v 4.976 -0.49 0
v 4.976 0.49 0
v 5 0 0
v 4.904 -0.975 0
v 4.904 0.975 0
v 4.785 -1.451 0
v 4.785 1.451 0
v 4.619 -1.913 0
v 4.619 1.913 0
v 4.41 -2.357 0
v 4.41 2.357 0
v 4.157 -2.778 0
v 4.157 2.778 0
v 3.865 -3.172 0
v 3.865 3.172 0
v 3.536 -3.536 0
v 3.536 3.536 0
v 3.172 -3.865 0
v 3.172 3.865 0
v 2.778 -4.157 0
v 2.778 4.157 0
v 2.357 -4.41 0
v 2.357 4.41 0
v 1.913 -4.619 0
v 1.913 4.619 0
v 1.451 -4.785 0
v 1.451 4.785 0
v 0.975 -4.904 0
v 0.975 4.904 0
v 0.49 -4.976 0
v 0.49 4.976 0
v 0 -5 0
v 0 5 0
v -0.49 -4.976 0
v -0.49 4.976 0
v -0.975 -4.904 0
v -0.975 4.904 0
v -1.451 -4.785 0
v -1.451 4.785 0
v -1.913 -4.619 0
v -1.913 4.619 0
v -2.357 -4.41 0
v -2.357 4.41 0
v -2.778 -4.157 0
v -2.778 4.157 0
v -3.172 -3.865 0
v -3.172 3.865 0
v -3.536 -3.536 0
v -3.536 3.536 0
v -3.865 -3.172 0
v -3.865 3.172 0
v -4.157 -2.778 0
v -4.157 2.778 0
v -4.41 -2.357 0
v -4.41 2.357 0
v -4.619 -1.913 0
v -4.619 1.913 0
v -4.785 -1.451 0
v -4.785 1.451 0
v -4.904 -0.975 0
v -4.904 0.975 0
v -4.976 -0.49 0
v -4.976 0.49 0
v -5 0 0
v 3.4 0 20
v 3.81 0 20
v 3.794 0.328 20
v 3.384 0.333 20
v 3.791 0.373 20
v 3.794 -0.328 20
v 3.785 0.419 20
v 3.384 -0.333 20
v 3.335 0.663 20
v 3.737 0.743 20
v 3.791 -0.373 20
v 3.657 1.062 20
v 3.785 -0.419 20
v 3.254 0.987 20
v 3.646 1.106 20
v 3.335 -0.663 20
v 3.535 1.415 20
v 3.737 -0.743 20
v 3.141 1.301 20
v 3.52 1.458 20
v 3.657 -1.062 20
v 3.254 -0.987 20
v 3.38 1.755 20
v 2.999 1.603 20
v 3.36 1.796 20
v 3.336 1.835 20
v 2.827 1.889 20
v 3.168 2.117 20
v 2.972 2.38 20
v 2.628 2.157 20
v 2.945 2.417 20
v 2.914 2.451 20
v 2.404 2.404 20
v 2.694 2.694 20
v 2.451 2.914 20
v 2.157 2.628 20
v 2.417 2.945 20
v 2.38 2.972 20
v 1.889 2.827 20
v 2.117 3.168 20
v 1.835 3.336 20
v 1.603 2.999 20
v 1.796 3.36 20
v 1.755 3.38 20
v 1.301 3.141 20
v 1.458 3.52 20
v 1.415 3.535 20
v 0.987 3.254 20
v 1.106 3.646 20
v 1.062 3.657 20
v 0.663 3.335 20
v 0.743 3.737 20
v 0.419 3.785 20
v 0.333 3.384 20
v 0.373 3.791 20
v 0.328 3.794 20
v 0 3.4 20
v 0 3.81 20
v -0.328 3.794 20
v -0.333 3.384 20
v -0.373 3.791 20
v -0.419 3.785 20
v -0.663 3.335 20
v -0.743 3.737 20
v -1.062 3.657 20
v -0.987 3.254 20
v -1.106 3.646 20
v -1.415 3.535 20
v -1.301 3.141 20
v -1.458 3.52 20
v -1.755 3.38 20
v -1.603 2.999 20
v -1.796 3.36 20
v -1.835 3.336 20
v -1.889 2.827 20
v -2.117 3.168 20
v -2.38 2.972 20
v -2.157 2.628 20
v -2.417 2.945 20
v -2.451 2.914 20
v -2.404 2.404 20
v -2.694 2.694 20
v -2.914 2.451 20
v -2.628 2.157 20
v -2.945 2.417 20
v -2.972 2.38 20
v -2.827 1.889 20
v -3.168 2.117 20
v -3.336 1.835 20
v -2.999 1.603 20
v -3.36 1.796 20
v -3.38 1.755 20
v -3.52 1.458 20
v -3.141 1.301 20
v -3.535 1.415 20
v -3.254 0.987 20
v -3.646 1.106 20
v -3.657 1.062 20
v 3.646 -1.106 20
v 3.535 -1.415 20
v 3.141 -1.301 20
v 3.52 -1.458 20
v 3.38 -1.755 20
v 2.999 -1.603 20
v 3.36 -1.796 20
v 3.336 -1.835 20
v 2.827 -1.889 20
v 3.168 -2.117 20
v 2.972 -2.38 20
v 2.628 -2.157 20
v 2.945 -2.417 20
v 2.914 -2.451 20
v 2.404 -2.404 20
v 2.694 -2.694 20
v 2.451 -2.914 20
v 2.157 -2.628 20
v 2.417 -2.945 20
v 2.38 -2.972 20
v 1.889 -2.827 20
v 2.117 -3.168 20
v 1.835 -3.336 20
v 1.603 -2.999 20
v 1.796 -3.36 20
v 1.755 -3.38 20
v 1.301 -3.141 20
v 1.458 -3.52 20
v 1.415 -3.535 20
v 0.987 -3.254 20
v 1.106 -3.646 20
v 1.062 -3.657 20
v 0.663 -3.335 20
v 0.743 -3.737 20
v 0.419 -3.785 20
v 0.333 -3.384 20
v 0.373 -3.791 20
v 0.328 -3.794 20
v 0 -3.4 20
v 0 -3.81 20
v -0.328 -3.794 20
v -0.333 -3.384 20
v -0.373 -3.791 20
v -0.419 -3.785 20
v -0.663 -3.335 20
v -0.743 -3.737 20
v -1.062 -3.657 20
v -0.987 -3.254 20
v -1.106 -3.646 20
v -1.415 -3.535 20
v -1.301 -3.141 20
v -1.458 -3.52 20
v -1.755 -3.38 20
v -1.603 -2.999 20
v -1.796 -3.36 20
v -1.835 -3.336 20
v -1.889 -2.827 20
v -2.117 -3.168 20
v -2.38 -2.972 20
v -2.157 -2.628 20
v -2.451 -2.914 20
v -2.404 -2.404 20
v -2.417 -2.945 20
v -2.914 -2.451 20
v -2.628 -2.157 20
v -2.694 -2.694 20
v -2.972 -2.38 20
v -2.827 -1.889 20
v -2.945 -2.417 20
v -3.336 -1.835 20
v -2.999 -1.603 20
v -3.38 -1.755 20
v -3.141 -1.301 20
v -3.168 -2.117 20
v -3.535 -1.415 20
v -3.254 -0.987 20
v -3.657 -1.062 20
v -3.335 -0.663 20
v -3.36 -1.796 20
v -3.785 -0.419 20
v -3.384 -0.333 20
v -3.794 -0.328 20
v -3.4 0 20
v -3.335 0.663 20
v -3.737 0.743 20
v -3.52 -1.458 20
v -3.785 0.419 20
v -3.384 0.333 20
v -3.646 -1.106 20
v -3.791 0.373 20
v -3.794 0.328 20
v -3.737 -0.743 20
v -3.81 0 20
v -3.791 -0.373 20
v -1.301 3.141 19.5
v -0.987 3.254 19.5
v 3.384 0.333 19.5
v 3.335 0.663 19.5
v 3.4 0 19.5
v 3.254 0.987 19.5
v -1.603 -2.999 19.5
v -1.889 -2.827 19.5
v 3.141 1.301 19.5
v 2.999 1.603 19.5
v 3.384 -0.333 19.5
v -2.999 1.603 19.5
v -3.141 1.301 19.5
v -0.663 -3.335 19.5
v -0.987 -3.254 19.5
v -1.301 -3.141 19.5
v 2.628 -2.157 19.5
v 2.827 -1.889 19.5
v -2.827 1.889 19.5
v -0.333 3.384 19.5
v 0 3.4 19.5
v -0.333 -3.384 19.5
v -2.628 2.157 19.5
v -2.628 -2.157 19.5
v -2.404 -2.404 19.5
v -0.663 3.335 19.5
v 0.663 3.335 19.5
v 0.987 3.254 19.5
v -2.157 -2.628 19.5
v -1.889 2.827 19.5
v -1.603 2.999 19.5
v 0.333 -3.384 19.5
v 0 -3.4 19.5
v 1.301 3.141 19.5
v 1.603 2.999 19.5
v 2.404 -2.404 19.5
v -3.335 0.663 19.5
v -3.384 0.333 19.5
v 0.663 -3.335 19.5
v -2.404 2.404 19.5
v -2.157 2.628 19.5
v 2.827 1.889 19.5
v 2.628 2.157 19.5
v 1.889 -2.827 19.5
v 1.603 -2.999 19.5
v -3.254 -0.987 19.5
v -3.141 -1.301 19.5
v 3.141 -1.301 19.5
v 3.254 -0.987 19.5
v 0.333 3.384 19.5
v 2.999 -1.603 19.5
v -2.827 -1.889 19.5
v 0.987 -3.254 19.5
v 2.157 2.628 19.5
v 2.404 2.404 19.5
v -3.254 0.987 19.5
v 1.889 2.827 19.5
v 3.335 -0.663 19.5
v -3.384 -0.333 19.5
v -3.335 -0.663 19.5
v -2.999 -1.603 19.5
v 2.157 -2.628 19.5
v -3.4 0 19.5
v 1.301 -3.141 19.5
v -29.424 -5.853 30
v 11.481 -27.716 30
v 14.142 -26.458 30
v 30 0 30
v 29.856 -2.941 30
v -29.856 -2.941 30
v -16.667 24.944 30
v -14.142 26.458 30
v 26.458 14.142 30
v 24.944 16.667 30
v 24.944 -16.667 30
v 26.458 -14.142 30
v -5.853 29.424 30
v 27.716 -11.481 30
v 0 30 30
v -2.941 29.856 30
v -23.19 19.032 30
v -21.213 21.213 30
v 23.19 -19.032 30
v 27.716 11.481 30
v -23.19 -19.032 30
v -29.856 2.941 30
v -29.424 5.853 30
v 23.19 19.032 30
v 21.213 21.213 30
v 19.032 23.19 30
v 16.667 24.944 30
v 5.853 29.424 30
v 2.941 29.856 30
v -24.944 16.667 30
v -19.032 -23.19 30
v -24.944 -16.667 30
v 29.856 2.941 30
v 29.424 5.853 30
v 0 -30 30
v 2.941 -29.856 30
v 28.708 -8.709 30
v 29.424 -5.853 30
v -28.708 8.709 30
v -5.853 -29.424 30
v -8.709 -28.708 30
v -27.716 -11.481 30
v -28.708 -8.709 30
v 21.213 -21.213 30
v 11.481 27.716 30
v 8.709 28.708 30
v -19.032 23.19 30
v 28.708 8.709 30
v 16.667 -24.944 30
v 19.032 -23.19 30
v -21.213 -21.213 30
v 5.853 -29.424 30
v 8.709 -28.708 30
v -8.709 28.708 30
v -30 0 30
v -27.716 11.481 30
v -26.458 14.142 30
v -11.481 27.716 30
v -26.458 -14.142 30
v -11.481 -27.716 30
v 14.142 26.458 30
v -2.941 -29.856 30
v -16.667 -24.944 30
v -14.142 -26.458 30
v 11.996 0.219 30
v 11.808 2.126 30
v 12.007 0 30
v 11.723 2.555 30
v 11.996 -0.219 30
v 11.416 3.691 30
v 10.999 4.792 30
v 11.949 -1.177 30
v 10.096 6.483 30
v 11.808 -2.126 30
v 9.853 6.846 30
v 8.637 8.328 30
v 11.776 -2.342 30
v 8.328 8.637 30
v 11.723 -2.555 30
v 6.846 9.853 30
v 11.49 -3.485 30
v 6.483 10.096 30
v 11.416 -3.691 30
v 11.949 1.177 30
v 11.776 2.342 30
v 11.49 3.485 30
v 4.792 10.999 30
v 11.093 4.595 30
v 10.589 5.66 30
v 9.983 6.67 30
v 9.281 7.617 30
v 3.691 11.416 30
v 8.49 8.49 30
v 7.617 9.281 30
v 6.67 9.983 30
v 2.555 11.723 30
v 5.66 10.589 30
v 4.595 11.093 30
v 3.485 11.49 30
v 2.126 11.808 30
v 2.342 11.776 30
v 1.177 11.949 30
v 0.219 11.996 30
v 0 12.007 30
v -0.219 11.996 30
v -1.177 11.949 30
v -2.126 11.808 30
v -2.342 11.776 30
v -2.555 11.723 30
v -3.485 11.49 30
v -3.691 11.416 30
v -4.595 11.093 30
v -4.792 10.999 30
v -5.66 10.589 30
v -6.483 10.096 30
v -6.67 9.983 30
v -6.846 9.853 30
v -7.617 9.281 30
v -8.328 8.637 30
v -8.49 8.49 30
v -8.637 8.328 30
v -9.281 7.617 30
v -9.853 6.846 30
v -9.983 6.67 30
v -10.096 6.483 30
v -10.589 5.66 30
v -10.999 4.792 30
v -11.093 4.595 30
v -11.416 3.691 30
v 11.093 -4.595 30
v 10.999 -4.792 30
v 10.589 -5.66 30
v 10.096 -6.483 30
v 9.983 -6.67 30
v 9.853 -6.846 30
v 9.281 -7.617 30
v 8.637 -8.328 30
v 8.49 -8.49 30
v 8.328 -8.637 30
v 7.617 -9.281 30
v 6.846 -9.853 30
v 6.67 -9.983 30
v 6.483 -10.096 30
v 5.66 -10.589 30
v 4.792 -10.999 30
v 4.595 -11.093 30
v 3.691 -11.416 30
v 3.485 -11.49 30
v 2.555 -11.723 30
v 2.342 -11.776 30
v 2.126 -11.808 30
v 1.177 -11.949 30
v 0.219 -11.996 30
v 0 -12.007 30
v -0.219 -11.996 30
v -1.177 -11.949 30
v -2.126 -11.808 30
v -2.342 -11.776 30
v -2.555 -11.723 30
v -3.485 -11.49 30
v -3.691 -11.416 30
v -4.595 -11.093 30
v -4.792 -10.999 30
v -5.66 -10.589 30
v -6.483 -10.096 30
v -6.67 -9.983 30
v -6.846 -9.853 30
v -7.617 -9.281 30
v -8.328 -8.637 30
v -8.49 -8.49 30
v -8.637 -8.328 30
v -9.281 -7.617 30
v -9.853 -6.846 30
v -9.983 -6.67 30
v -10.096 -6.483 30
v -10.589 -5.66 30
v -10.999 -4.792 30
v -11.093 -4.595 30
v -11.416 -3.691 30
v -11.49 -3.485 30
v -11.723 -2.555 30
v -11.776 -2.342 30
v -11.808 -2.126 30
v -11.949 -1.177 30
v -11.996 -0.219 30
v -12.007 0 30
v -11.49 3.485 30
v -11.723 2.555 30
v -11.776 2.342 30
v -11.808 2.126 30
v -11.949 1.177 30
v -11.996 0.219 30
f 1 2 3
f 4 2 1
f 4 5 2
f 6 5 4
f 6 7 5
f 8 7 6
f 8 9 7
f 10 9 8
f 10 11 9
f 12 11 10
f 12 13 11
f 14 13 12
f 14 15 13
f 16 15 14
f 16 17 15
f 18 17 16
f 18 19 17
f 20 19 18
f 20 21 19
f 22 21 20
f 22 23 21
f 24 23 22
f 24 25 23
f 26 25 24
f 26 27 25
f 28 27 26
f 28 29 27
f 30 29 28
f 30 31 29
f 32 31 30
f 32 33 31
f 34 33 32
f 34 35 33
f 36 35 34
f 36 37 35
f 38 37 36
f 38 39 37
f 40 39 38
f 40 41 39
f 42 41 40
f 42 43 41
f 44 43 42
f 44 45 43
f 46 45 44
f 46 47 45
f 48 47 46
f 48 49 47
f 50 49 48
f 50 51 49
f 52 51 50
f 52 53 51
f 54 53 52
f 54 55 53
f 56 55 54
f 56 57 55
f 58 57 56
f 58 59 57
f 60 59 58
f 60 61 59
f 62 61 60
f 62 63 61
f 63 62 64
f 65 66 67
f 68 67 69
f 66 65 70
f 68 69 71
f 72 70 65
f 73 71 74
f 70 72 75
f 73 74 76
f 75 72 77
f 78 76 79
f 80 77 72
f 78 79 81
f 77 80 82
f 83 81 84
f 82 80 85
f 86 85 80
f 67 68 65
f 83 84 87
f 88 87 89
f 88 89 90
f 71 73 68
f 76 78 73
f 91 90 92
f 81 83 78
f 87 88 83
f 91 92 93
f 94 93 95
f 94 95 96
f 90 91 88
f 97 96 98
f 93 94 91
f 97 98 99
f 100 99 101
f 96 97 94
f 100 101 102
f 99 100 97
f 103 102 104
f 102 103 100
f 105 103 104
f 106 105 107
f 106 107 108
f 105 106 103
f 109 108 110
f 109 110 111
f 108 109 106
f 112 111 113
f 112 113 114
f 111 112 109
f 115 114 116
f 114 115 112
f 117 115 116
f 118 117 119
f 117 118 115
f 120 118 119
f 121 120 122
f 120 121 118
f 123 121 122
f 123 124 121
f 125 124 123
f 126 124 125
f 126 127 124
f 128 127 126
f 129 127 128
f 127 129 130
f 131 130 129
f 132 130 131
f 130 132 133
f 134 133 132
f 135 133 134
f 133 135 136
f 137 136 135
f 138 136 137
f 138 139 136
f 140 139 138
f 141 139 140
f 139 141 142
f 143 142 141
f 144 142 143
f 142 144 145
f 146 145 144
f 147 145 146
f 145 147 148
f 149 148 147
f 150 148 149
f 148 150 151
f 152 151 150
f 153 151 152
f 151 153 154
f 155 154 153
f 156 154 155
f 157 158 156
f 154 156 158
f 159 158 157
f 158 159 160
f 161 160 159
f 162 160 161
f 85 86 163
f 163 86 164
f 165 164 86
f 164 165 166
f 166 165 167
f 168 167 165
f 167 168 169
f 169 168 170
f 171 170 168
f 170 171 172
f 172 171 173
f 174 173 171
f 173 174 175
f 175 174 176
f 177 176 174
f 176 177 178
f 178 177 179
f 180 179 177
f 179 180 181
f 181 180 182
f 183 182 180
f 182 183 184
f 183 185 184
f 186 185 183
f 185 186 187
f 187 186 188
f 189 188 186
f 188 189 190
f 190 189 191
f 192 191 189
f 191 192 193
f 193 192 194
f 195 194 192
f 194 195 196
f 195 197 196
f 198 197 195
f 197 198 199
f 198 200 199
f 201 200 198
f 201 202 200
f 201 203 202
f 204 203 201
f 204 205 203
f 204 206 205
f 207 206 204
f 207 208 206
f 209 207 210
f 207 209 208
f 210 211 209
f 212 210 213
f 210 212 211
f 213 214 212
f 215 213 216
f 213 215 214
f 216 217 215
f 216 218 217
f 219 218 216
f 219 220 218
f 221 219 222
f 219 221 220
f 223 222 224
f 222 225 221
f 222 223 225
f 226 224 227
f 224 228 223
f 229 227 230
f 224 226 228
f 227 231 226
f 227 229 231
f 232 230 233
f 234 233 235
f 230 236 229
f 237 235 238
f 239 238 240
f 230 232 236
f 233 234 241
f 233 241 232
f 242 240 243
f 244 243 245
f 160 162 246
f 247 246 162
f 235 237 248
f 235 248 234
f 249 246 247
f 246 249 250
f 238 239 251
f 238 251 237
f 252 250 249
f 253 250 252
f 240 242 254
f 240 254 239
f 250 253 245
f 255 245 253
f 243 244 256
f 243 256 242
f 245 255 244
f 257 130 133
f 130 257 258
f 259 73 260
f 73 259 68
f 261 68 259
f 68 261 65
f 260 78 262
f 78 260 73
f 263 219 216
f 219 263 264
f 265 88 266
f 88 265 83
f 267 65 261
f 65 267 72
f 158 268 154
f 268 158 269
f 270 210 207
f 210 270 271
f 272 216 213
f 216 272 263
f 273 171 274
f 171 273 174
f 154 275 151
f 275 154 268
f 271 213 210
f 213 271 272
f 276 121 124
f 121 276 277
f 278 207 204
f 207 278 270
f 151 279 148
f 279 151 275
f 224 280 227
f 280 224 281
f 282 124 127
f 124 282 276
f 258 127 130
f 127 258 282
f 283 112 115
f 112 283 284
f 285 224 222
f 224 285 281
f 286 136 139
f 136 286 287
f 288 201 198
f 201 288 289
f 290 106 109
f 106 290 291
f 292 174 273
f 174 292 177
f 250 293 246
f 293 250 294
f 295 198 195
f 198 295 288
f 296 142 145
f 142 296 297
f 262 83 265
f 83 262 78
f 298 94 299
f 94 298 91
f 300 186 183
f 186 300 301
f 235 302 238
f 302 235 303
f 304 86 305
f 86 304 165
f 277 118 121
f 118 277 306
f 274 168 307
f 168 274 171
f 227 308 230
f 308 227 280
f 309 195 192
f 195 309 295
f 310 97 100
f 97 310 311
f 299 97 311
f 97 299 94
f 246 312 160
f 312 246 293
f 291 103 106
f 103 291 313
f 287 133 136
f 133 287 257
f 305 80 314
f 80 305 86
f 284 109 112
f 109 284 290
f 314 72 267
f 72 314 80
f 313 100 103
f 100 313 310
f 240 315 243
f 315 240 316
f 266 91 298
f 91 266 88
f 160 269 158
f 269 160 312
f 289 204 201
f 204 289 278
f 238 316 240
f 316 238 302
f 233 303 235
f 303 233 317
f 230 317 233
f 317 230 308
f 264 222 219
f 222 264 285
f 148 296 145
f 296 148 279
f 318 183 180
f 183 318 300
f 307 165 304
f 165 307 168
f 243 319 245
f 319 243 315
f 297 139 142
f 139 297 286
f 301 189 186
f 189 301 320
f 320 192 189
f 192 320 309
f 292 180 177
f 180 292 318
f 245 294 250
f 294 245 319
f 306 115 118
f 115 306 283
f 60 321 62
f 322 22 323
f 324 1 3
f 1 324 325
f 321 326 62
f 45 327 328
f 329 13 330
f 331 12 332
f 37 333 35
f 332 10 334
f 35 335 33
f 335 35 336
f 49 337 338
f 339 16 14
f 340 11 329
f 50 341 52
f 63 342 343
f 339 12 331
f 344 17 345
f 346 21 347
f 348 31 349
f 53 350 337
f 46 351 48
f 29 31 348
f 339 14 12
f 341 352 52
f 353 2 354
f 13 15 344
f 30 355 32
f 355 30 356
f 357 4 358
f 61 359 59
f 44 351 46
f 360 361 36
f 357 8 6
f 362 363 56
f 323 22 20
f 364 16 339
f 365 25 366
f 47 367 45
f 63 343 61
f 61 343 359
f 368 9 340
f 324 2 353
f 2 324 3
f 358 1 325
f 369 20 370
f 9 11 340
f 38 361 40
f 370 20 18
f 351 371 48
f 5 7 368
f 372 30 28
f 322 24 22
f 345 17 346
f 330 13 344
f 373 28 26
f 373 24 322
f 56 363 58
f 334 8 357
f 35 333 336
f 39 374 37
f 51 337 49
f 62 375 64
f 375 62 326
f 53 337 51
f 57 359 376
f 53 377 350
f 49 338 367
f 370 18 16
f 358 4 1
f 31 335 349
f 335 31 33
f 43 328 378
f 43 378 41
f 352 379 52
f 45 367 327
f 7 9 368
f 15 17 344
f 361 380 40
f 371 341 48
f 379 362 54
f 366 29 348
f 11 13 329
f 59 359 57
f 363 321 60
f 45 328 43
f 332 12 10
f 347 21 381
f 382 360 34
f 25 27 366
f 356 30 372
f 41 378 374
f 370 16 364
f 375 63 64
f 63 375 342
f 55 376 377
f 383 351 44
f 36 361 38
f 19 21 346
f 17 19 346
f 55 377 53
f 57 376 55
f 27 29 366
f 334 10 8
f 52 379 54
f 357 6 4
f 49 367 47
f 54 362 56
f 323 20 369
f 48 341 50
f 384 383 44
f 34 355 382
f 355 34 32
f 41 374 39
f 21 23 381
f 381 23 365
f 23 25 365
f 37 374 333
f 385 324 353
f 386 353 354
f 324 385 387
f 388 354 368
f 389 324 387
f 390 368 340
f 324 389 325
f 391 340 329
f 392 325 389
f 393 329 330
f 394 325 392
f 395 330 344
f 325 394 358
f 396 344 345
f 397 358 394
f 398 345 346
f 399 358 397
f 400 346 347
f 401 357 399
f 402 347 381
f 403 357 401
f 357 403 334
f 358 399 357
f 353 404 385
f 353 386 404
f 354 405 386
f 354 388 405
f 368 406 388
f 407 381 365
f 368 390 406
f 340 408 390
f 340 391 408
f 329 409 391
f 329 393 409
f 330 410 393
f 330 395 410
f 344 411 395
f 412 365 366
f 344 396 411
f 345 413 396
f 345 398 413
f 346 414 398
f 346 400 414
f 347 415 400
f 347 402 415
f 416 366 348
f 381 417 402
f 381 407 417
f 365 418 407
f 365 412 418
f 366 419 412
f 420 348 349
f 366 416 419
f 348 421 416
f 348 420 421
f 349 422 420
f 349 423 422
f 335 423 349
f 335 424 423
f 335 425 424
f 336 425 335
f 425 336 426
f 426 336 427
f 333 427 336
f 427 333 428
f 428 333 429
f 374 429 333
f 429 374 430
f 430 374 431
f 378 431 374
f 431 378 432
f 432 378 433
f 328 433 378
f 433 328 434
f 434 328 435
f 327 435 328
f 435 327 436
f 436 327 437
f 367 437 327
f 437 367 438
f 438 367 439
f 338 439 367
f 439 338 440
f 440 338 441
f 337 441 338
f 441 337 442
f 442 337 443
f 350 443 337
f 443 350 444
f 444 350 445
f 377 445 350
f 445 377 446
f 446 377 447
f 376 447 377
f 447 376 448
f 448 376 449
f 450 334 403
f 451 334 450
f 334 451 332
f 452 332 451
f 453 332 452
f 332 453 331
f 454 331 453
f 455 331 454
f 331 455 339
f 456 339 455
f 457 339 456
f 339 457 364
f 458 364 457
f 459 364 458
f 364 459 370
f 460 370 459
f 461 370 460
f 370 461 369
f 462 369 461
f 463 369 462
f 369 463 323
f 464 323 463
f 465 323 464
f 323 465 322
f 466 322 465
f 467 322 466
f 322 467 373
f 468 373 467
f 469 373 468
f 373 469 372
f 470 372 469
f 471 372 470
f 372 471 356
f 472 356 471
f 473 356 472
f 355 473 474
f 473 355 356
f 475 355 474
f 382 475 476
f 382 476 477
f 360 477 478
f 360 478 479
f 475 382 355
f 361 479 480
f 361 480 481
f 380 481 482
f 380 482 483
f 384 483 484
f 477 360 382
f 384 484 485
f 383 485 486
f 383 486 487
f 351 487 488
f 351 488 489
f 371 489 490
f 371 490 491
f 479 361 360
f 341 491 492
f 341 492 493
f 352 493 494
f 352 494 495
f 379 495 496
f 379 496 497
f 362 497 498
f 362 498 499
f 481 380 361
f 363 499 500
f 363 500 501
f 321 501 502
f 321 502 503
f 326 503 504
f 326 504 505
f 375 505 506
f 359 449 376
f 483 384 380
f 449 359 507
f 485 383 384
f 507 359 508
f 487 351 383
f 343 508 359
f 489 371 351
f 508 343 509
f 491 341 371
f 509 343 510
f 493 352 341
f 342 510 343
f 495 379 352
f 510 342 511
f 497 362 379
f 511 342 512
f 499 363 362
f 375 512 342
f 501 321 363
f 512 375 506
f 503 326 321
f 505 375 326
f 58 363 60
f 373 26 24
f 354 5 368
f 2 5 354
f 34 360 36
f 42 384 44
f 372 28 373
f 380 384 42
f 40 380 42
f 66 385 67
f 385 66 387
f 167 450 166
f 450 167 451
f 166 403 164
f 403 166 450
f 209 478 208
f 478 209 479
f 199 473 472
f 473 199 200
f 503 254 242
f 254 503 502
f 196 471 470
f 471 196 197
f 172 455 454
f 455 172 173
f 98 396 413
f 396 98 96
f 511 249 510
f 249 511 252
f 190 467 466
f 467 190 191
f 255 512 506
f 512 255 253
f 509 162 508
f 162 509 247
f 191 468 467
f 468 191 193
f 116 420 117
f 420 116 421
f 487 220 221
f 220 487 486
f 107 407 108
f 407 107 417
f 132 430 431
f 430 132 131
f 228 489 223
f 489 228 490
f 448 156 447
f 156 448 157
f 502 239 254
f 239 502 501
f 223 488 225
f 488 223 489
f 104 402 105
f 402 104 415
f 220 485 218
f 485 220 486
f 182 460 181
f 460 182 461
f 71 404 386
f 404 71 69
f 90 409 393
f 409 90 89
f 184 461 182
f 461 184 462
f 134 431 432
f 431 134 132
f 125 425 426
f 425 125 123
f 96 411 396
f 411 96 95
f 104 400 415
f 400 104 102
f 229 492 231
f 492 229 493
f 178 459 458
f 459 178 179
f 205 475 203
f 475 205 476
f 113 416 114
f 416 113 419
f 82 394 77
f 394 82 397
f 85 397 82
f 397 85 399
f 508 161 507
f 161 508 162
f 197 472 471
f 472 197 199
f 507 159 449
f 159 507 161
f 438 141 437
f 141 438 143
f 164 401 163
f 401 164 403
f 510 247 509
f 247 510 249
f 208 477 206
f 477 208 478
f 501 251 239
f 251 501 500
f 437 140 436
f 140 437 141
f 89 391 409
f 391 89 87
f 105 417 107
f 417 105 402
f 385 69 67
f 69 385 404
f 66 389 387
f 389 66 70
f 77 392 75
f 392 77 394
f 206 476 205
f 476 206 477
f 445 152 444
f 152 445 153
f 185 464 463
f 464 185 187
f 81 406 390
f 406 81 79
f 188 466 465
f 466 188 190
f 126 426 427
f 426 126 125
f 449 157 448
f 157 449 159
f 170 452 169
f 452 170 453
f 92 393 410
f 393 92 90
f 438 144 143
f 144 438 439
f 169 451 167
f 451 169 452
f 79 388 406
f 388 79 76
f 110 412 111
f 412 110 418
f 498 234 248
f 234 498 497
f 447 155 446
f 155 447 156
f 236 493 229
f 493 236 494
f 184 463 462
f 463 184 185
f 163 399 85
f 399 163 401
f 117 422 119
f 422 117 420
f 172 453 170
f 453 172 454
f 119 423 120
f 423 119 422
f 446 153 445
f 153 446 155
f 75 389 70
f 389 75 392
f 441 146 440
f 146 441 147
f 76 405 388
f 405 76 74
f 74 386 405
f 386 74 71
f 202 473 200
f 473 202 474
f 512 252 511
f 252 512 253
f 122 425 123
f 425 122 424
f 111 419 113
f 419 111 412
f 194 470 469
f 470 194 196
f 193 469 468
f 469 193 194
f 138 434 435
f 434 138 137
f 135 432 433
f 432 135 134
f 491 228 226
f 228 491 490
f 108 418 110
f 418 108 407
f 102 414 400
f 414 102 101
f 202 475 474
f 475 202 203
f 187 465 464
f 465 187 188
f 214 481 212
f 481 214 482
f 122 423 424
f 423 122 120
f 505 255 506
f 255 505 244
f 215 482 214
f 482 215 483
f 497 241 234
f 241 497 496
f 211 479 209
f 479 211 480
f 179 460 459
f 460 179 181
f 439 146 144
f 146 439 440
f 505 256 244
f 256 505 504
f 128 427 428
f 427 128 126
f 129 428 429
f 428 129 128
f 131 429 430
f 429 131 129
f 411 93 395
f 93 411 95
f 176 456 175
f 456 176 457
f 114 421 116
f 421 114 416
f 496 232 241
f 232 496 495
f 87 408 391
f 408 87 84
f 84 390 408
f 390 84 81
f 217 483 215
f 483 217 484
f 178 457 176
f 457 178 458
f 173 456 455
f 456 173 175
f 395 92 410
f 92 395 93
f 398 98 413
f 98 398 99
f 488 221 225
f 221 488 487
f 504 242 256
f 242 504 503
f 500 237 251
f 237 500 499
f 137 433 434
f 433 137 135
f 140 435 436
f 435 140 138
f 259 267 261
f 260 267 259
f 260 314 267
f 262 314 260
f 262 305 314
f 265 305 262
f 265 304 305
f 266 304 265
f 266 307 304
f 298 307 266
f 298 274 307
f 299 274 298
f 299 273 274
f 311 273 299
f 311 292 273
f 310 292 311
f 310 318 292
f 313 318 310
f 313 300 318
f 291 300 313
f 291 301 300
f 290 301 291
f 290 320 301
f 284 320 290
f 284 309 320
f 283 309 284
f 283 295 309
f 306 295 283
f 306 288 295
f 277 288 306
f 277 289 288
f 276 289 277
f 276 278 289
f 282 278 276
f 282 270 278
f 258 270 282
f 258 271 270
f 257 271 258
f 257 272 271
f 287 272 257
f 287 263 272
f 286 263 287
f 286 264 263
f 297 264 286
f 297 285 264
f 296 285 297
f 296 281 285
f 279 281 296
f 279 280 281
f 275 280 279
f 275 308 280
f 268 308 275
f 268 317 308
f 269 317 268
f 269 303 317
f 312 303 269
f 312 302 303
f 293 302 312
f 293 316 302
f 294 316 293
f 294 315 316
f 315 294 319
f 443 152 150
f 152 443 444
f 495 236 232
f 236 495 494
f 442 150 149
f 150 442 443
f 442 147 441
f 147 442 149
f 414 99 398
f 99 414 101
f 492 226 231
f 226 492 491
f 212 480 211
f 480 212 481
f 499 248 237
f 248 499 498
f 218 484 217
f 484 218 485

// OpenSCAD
// Funnel with spout - printed upright, wide opening at top
// Units: mm. Wall thickness 1.6 mm throughout.

// ---------- Parameters ----------
spout_od      = 10;    // spout outer diameter
spout_length  = 20;    // spout runs from z = 0 to z = 20
cone_top_d    = 60;    // cone rim outer diameter at z = 50
cone_bottom_d = 10;    // cone starts at same diameter as spout (z = 20)
rim_height    = 30;    // cone height, so rim at z = 20 + 30 = 50
wall          = 1.6;   // wall thickness everywhere
eps           = 0.5;   // cutter overshoot past faces

$fn = 64;

// ---------- Derived ----------
spout_id = spout_od - 2 * wall;   // bore of spout (6.8 mm)
cone_top_id = cone_top_d - 2 * wall;  // rim inner diameter (56.8 mm)
cone_bottom_id = cone_bottom_d - 2 * wall;  // cone bottom inner diameter (6.8 mm)

// ---------- Model ----------
union() {
    // Spout: straight tube, open at both ends
    difference() {
        cylinder(d = spout_od, h = spout_length);
        translate([0, 0, -eps])
            cylinder(d = spout_id, h = spout_length + 2 * eps);
    }

    // Cone: frustum widening from z = 20 to z = 50, open top and bottom
    difference() {
        cylinder(d1 = cone_bottom_d, d2 = cone_top_d, h = rim_height);
        translate([0, 0, spout_length - eps])
            cylinder(d1 = cone_bottom_id, d2 = cone_top_id, h = rim_height + eps);
    }
}
